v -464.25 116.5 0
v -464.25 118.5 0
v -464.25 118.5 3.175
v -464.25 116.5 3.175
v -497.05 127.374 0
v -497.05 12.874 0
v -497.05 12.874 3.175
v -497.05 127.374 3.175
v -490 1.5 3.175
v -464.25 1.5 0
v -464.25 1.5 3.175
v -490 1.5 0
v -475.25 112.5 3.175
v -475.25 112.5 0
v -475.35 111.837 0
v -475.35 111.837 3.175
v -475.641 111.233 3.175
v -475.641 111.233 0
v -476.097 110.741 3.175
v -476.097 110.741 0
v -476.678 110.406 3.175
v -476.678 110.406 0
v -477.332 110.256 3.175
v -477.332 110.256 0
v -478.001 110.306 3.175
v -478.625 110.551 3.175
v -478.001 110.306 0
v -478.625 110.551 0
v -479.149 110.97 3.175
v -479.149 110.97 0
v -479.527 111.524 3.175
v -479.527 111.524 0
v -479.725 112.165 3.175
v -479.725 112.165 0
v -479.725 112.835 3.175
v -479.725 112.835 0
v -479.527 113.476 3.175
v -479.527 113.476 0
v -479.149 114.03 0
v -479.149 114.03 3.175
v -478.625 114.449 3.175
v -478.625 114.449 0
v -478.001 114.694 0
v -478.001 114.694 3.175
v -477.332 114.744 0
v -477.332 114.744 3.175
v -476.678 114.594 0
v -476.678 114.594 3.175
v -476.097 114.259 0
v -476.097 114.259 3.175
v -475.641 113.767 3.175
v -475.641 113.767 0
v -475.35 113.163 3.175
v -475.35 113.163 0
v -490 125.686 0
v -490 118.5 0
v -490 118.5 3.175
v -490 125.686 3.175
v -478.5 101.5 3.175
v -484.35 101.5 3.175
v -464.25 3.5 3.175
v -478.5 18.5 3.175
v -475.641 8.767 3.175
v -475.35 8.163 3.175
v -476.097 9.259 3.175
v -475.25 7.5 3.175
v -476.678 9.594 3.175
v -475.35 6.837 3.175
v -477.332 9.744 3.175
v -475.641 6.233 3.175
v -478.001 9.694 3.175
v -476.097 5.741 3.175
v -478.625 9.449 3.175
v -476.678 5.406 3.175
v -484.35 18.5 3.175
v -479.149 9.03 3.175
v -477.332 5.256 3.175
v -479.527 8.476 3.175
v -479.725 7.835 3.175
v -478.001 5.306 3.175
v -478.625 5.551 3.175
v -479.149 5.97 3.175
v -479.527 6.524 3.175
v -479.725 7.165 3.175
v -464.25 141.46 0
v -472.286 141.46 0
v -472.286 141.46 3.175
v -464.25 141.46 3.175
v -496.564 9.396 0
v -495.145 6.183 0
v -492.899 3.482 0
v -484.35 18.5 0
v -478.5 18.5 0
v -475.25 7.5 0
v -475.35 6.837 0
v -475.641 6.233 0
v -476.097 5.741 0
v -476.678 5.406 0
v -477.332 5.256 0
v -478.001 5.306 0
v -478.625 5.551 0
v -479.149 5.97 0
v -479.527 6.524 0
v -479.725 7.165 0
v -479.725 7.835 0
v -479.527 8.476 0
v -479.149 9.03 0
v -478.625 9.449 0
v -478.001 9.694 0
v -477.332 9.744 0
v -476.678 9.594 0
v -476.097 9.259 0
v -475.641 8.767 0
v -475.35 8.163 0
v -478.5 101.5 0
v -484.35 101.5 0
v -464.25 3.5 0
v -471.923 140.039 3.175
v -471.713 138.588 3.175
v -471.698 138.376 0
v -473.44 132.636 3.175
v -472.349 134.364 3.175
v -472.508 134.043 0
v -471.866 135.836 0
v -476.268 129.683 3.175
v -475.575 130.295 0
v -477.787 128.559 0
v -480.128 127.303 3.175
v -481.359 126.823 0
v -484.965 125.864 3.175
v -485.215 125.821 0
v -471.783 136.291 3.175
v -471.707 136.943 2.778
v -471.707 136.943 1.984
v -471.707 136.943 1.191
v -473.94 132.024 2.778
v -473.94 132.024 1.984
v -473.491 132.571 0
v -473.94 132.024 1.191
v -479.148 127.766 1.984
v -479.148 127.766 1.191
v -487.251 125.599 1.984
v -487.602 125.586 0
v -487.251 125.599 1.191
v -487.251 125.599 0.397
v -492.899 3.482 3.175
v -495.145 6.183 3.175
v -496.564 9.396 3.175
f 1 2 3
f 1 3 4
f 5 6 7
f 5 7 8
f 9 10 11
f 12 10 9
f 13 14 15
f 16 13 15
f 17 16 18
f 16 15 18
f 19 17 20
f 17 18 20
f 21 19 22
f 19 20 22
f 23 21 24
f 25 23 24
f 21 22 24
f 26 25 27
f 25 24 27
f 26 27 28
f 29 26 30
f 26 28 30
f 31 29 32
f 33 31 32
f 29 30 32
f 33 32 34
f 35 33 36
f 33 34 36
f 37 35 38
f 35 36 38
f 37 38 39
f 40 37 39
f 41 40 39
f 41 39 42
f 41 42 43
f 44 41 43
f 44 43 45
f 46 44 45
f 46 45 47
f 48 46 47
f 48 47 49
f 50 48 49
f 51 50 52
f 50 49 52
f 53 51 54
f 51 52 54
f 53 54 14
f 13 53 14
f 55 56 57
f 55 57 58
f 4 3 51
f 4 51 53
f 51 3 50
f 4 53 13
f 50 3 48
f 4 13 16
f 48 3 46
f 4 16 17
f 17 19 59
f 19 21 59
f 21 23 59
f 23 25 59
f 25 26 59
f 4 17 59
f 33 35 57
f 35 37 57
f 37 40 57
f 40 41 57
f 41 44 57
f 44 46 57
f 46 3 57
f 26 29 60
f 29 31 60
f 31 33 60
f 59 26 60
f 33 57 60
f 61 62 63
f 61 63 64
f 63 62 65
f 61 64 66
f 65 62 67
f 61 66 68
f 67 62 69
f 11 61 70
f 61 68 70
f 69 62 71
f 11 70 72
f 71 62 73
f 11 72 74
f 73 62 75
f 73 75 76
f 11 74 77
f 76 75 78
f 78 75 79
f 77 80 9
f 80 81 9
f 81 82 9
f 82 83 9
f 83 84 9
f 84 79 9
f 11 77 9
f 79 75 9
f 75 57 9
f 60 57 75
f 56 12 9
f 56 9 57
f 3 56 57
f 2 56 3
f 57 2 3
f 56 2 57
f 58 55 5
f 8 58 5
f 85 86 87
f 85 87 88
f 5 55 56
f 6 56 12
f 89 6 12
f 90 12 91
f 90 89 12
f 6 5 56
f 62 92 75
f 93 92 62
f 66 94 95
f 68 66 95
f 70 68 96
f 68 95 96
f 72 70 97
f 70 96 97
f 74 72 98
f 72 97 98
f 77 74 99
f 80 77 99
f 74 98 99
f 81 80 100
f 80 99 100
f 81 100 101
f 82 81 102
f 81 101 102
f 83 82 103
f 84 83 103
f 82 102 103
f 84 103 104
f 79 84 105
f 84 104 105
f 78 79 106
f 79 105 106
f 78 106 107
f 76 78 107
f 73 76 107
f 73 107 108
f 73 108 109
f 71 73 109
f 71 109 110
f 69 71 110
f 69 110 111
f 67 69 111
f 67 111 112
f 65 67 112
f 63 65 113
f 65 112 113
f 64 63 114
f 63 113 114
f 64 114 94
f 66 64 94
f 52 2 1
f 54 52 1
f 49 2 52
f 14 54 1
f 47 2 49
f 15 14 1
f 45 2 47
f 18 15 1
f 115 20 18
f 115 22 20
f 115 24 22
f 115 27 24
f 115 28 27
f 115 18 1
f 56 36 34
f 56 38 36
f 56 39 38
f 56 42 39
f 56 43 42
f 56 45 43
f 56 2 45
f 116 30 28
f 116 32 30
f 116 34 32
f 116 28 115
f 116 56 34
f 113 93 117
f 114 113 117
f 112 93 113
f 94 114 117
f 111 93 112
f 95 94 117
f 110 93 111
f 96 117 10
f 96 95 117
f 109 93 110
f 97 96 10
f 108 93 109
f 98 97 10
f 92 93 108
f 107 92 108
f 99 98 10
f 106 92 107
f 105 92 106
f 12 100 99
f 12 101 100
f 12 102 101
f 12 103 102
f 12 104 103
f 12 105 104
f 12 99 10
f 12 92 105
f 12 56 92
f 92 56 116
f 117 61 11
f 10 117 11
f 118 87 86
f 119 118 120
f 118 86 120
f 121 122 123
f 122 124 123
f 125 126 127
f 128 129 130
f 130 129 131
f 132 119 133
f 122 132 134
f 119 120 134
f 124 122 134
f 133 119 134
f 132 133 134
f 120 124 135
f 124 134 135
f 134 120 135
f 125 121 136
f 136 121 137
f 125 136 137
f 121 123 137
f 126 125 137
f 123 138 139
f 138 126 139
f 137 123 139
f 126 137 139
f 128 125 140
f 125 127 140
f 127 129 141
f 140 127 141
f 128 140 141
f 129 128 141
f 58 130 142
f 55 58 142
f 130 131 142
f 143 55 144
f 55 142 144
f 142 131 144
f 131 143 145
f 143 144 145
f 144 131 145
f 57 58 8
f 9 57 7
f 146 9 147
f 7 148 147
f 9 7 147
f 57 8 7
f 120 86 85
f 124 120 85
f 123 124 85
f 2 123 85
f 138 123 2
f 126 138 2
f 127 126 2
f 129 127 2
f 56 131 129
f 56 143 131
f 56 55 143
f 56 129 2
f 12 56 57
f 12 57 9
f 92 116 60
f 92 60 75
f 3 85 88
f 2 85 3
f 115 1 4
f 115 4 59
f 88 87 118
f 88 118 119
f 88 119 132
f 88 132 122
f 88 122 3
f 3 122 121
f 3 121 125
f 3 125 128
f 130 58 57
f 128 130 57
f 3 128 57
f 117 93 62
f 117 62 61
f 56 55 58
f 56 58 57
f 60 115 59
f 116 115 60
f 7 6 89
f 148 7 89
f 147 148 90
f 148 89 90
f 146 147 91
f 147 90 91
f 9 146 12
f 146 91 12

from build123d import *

# Parameters (mm, degrees)
F_3DSKETCH1_R         = 2.25
BOSS_EXTRUDE1_DEPTH   = 3.175
BOSS_EXTRUDE1_2_DEPTH = 3.175
BOSS_EXTRUDE1_3_DEPTH = 3.175
CUT_EXTRUDE1_DEPTH    = 6.858
FILLET1_R             = 12.7


with BuildPart() as part:
    # 3DSketch1 → Boss-Extrude1 (new body)
    with BuildSketch(Plane(origin=(-464.25, 116.5, 0), x_dir=(-0.2742793236442644, -0.961650067655197, 0), z_dir=(0, 0, -1))):
        Polygon((-1.923300135, 0.548558647), (0, 0), (18.333231377, 9.589323609), (19.93776542, 15.214976505), (99.754721035, -7.550207357), (98.150186992, -13.175860253), (108.666457645, -30.993563572), (110.58975778, -31.542122219), (117.652450364, -6.779632977), (5.139392449, 25.311047889), align=None)
        with Locations(Location((108.454058413, -17.154582881, 0), (0, 0, 254.080928829))):
            Circle(F_3DSKETCH1_R, mode=Mode.SUBTRACT)
        with Locations(Location((7.480801309, 11.644746102, 0), (0, 0, 254.080928829))):
            Circle(F_3DSKETCH1_R, mode=Mode.SUBTRACT)
    extrude(amount=-BOSS_EXTRUDE1_DEPTH)


with BuildPart() as body_2:
    # 3DSketch1 → Boss-Extrude1 2 (new body)
    with BuildSketch(Plane(origin=(-464.25, 116.5, 0), x_dir=(-0.2742793236442644, -0.961650067655197, 0), z_dir=(0, 0, -1))):
        Polygon((-24.002556771, 6.845946627), (-1.923300135, 0.548558647), (5.139392449, 25.311047889), (-16.939864187, 31.608435869), align=None)
    extrude(amount=-BOSS_EXTRUDE1_2_DEPTH)


with BuildPart() as body_3:
    # 3DSketch1 → Boss-Extrude1 3 (new body)
    with BuildSketch(Plane(origin=(-464.25, 116.5, 0), x_dir=(-0.2742793236442644, -0.961650067655197, 0), z_dir=(0, 0, -1))):
        Polygon((-16.939864187, 31.608435869), (5.139392449, 25.311047889), (117.652450364, -6.779632977), (119.586119596, 0), (-15.006194955, 38.388068846), align=None)
    extrude(amount=-BOSS_EXTRUDE1_3_DEPTH)


with BuildPart() as cut_extrude1_tool:
    # Sketch1 → Cut-Extrude1 (new body)
    with BuildSketch(Plane(origin=(0, 0, 0), x_dir=(-1, 0, 0), z_dir=(0, 0, -1))):
        with BuildLine():
            Line((472.286101812, 141.459761953), (497.05, 141.459761953))
            Line((497.05, 141.459761953), (497.05, 127.374197193))
            add(Edge.make_bspline(
                [(472.286101812, 141.459761953), (471.839311888, 139.996705849), (471.446482376, 137.63307279), (472.167376182, 134.273923046), (473.819960888, 132.089102365), (476.035631474, 129.726261313), (478.913541328, 127.696041036), (482.87198304, 126.231214629), (488.965357723, 125.016223815), (493.945609682, 126.32208958), (497.05, 127.374197193)],
                knots=[0, 0, 0, 0, 0.129736075, 0.200847285, 0.285412729, 0.358404023, 0.477149408, 0.580374686, 0.71621499, 1, 1, 1, 1], degree=3))
        make_face()
    extrude(amount=-CUT_EXTRUDE1_DEPTH)


with BuildPart() as body_2_1:
    add(body_2.part)

    # Cut-Extrude1: cut by cut_extrude1_tool
    add(cut_extrude1_tool.part, mode=Mode.SUBTRACT)


with BuildPart() as body_3_1:
    add(body_3.part)

    # Cut-Extrude1: cut by cut_extrude1_tool
    add(cut_extrude1_tool.part, mode=Mode.SUBTRACT)

    # Fillet1
    # the kernel refuses this fillet: 12.7 mm, written as the material it takes off along each edge
    with BuildSketch(Plane(origin=(-497.05, 1.5, -28.434958678), x_dir=(0, 1, 0), z_dir=(0, 0, 1))) as fillet1_piece_1:
        with BuildLine():
            CenterArc((11.373983471, -12.7), FILLET1_R, 90, 63.584217644)
            Line((0, -7.05), (-0.227479669, -6.937))
            ThreePointArc((-0.227479669, -6.937), (-0.254, -3.525), (-0.254, 0))
            Line((-0.254, 0), (0, 0.254))
            Line((0, 0.254), (11.373983471, 0.254))
            Line((11.373983471, 0.254), (11.373983471, 0))
        make_face()
    extrude(amount=60.044917355, mode=Mode.SUBTRACT)


solid = Compound([part.part, body_2_1.part, body_3_1.part])
